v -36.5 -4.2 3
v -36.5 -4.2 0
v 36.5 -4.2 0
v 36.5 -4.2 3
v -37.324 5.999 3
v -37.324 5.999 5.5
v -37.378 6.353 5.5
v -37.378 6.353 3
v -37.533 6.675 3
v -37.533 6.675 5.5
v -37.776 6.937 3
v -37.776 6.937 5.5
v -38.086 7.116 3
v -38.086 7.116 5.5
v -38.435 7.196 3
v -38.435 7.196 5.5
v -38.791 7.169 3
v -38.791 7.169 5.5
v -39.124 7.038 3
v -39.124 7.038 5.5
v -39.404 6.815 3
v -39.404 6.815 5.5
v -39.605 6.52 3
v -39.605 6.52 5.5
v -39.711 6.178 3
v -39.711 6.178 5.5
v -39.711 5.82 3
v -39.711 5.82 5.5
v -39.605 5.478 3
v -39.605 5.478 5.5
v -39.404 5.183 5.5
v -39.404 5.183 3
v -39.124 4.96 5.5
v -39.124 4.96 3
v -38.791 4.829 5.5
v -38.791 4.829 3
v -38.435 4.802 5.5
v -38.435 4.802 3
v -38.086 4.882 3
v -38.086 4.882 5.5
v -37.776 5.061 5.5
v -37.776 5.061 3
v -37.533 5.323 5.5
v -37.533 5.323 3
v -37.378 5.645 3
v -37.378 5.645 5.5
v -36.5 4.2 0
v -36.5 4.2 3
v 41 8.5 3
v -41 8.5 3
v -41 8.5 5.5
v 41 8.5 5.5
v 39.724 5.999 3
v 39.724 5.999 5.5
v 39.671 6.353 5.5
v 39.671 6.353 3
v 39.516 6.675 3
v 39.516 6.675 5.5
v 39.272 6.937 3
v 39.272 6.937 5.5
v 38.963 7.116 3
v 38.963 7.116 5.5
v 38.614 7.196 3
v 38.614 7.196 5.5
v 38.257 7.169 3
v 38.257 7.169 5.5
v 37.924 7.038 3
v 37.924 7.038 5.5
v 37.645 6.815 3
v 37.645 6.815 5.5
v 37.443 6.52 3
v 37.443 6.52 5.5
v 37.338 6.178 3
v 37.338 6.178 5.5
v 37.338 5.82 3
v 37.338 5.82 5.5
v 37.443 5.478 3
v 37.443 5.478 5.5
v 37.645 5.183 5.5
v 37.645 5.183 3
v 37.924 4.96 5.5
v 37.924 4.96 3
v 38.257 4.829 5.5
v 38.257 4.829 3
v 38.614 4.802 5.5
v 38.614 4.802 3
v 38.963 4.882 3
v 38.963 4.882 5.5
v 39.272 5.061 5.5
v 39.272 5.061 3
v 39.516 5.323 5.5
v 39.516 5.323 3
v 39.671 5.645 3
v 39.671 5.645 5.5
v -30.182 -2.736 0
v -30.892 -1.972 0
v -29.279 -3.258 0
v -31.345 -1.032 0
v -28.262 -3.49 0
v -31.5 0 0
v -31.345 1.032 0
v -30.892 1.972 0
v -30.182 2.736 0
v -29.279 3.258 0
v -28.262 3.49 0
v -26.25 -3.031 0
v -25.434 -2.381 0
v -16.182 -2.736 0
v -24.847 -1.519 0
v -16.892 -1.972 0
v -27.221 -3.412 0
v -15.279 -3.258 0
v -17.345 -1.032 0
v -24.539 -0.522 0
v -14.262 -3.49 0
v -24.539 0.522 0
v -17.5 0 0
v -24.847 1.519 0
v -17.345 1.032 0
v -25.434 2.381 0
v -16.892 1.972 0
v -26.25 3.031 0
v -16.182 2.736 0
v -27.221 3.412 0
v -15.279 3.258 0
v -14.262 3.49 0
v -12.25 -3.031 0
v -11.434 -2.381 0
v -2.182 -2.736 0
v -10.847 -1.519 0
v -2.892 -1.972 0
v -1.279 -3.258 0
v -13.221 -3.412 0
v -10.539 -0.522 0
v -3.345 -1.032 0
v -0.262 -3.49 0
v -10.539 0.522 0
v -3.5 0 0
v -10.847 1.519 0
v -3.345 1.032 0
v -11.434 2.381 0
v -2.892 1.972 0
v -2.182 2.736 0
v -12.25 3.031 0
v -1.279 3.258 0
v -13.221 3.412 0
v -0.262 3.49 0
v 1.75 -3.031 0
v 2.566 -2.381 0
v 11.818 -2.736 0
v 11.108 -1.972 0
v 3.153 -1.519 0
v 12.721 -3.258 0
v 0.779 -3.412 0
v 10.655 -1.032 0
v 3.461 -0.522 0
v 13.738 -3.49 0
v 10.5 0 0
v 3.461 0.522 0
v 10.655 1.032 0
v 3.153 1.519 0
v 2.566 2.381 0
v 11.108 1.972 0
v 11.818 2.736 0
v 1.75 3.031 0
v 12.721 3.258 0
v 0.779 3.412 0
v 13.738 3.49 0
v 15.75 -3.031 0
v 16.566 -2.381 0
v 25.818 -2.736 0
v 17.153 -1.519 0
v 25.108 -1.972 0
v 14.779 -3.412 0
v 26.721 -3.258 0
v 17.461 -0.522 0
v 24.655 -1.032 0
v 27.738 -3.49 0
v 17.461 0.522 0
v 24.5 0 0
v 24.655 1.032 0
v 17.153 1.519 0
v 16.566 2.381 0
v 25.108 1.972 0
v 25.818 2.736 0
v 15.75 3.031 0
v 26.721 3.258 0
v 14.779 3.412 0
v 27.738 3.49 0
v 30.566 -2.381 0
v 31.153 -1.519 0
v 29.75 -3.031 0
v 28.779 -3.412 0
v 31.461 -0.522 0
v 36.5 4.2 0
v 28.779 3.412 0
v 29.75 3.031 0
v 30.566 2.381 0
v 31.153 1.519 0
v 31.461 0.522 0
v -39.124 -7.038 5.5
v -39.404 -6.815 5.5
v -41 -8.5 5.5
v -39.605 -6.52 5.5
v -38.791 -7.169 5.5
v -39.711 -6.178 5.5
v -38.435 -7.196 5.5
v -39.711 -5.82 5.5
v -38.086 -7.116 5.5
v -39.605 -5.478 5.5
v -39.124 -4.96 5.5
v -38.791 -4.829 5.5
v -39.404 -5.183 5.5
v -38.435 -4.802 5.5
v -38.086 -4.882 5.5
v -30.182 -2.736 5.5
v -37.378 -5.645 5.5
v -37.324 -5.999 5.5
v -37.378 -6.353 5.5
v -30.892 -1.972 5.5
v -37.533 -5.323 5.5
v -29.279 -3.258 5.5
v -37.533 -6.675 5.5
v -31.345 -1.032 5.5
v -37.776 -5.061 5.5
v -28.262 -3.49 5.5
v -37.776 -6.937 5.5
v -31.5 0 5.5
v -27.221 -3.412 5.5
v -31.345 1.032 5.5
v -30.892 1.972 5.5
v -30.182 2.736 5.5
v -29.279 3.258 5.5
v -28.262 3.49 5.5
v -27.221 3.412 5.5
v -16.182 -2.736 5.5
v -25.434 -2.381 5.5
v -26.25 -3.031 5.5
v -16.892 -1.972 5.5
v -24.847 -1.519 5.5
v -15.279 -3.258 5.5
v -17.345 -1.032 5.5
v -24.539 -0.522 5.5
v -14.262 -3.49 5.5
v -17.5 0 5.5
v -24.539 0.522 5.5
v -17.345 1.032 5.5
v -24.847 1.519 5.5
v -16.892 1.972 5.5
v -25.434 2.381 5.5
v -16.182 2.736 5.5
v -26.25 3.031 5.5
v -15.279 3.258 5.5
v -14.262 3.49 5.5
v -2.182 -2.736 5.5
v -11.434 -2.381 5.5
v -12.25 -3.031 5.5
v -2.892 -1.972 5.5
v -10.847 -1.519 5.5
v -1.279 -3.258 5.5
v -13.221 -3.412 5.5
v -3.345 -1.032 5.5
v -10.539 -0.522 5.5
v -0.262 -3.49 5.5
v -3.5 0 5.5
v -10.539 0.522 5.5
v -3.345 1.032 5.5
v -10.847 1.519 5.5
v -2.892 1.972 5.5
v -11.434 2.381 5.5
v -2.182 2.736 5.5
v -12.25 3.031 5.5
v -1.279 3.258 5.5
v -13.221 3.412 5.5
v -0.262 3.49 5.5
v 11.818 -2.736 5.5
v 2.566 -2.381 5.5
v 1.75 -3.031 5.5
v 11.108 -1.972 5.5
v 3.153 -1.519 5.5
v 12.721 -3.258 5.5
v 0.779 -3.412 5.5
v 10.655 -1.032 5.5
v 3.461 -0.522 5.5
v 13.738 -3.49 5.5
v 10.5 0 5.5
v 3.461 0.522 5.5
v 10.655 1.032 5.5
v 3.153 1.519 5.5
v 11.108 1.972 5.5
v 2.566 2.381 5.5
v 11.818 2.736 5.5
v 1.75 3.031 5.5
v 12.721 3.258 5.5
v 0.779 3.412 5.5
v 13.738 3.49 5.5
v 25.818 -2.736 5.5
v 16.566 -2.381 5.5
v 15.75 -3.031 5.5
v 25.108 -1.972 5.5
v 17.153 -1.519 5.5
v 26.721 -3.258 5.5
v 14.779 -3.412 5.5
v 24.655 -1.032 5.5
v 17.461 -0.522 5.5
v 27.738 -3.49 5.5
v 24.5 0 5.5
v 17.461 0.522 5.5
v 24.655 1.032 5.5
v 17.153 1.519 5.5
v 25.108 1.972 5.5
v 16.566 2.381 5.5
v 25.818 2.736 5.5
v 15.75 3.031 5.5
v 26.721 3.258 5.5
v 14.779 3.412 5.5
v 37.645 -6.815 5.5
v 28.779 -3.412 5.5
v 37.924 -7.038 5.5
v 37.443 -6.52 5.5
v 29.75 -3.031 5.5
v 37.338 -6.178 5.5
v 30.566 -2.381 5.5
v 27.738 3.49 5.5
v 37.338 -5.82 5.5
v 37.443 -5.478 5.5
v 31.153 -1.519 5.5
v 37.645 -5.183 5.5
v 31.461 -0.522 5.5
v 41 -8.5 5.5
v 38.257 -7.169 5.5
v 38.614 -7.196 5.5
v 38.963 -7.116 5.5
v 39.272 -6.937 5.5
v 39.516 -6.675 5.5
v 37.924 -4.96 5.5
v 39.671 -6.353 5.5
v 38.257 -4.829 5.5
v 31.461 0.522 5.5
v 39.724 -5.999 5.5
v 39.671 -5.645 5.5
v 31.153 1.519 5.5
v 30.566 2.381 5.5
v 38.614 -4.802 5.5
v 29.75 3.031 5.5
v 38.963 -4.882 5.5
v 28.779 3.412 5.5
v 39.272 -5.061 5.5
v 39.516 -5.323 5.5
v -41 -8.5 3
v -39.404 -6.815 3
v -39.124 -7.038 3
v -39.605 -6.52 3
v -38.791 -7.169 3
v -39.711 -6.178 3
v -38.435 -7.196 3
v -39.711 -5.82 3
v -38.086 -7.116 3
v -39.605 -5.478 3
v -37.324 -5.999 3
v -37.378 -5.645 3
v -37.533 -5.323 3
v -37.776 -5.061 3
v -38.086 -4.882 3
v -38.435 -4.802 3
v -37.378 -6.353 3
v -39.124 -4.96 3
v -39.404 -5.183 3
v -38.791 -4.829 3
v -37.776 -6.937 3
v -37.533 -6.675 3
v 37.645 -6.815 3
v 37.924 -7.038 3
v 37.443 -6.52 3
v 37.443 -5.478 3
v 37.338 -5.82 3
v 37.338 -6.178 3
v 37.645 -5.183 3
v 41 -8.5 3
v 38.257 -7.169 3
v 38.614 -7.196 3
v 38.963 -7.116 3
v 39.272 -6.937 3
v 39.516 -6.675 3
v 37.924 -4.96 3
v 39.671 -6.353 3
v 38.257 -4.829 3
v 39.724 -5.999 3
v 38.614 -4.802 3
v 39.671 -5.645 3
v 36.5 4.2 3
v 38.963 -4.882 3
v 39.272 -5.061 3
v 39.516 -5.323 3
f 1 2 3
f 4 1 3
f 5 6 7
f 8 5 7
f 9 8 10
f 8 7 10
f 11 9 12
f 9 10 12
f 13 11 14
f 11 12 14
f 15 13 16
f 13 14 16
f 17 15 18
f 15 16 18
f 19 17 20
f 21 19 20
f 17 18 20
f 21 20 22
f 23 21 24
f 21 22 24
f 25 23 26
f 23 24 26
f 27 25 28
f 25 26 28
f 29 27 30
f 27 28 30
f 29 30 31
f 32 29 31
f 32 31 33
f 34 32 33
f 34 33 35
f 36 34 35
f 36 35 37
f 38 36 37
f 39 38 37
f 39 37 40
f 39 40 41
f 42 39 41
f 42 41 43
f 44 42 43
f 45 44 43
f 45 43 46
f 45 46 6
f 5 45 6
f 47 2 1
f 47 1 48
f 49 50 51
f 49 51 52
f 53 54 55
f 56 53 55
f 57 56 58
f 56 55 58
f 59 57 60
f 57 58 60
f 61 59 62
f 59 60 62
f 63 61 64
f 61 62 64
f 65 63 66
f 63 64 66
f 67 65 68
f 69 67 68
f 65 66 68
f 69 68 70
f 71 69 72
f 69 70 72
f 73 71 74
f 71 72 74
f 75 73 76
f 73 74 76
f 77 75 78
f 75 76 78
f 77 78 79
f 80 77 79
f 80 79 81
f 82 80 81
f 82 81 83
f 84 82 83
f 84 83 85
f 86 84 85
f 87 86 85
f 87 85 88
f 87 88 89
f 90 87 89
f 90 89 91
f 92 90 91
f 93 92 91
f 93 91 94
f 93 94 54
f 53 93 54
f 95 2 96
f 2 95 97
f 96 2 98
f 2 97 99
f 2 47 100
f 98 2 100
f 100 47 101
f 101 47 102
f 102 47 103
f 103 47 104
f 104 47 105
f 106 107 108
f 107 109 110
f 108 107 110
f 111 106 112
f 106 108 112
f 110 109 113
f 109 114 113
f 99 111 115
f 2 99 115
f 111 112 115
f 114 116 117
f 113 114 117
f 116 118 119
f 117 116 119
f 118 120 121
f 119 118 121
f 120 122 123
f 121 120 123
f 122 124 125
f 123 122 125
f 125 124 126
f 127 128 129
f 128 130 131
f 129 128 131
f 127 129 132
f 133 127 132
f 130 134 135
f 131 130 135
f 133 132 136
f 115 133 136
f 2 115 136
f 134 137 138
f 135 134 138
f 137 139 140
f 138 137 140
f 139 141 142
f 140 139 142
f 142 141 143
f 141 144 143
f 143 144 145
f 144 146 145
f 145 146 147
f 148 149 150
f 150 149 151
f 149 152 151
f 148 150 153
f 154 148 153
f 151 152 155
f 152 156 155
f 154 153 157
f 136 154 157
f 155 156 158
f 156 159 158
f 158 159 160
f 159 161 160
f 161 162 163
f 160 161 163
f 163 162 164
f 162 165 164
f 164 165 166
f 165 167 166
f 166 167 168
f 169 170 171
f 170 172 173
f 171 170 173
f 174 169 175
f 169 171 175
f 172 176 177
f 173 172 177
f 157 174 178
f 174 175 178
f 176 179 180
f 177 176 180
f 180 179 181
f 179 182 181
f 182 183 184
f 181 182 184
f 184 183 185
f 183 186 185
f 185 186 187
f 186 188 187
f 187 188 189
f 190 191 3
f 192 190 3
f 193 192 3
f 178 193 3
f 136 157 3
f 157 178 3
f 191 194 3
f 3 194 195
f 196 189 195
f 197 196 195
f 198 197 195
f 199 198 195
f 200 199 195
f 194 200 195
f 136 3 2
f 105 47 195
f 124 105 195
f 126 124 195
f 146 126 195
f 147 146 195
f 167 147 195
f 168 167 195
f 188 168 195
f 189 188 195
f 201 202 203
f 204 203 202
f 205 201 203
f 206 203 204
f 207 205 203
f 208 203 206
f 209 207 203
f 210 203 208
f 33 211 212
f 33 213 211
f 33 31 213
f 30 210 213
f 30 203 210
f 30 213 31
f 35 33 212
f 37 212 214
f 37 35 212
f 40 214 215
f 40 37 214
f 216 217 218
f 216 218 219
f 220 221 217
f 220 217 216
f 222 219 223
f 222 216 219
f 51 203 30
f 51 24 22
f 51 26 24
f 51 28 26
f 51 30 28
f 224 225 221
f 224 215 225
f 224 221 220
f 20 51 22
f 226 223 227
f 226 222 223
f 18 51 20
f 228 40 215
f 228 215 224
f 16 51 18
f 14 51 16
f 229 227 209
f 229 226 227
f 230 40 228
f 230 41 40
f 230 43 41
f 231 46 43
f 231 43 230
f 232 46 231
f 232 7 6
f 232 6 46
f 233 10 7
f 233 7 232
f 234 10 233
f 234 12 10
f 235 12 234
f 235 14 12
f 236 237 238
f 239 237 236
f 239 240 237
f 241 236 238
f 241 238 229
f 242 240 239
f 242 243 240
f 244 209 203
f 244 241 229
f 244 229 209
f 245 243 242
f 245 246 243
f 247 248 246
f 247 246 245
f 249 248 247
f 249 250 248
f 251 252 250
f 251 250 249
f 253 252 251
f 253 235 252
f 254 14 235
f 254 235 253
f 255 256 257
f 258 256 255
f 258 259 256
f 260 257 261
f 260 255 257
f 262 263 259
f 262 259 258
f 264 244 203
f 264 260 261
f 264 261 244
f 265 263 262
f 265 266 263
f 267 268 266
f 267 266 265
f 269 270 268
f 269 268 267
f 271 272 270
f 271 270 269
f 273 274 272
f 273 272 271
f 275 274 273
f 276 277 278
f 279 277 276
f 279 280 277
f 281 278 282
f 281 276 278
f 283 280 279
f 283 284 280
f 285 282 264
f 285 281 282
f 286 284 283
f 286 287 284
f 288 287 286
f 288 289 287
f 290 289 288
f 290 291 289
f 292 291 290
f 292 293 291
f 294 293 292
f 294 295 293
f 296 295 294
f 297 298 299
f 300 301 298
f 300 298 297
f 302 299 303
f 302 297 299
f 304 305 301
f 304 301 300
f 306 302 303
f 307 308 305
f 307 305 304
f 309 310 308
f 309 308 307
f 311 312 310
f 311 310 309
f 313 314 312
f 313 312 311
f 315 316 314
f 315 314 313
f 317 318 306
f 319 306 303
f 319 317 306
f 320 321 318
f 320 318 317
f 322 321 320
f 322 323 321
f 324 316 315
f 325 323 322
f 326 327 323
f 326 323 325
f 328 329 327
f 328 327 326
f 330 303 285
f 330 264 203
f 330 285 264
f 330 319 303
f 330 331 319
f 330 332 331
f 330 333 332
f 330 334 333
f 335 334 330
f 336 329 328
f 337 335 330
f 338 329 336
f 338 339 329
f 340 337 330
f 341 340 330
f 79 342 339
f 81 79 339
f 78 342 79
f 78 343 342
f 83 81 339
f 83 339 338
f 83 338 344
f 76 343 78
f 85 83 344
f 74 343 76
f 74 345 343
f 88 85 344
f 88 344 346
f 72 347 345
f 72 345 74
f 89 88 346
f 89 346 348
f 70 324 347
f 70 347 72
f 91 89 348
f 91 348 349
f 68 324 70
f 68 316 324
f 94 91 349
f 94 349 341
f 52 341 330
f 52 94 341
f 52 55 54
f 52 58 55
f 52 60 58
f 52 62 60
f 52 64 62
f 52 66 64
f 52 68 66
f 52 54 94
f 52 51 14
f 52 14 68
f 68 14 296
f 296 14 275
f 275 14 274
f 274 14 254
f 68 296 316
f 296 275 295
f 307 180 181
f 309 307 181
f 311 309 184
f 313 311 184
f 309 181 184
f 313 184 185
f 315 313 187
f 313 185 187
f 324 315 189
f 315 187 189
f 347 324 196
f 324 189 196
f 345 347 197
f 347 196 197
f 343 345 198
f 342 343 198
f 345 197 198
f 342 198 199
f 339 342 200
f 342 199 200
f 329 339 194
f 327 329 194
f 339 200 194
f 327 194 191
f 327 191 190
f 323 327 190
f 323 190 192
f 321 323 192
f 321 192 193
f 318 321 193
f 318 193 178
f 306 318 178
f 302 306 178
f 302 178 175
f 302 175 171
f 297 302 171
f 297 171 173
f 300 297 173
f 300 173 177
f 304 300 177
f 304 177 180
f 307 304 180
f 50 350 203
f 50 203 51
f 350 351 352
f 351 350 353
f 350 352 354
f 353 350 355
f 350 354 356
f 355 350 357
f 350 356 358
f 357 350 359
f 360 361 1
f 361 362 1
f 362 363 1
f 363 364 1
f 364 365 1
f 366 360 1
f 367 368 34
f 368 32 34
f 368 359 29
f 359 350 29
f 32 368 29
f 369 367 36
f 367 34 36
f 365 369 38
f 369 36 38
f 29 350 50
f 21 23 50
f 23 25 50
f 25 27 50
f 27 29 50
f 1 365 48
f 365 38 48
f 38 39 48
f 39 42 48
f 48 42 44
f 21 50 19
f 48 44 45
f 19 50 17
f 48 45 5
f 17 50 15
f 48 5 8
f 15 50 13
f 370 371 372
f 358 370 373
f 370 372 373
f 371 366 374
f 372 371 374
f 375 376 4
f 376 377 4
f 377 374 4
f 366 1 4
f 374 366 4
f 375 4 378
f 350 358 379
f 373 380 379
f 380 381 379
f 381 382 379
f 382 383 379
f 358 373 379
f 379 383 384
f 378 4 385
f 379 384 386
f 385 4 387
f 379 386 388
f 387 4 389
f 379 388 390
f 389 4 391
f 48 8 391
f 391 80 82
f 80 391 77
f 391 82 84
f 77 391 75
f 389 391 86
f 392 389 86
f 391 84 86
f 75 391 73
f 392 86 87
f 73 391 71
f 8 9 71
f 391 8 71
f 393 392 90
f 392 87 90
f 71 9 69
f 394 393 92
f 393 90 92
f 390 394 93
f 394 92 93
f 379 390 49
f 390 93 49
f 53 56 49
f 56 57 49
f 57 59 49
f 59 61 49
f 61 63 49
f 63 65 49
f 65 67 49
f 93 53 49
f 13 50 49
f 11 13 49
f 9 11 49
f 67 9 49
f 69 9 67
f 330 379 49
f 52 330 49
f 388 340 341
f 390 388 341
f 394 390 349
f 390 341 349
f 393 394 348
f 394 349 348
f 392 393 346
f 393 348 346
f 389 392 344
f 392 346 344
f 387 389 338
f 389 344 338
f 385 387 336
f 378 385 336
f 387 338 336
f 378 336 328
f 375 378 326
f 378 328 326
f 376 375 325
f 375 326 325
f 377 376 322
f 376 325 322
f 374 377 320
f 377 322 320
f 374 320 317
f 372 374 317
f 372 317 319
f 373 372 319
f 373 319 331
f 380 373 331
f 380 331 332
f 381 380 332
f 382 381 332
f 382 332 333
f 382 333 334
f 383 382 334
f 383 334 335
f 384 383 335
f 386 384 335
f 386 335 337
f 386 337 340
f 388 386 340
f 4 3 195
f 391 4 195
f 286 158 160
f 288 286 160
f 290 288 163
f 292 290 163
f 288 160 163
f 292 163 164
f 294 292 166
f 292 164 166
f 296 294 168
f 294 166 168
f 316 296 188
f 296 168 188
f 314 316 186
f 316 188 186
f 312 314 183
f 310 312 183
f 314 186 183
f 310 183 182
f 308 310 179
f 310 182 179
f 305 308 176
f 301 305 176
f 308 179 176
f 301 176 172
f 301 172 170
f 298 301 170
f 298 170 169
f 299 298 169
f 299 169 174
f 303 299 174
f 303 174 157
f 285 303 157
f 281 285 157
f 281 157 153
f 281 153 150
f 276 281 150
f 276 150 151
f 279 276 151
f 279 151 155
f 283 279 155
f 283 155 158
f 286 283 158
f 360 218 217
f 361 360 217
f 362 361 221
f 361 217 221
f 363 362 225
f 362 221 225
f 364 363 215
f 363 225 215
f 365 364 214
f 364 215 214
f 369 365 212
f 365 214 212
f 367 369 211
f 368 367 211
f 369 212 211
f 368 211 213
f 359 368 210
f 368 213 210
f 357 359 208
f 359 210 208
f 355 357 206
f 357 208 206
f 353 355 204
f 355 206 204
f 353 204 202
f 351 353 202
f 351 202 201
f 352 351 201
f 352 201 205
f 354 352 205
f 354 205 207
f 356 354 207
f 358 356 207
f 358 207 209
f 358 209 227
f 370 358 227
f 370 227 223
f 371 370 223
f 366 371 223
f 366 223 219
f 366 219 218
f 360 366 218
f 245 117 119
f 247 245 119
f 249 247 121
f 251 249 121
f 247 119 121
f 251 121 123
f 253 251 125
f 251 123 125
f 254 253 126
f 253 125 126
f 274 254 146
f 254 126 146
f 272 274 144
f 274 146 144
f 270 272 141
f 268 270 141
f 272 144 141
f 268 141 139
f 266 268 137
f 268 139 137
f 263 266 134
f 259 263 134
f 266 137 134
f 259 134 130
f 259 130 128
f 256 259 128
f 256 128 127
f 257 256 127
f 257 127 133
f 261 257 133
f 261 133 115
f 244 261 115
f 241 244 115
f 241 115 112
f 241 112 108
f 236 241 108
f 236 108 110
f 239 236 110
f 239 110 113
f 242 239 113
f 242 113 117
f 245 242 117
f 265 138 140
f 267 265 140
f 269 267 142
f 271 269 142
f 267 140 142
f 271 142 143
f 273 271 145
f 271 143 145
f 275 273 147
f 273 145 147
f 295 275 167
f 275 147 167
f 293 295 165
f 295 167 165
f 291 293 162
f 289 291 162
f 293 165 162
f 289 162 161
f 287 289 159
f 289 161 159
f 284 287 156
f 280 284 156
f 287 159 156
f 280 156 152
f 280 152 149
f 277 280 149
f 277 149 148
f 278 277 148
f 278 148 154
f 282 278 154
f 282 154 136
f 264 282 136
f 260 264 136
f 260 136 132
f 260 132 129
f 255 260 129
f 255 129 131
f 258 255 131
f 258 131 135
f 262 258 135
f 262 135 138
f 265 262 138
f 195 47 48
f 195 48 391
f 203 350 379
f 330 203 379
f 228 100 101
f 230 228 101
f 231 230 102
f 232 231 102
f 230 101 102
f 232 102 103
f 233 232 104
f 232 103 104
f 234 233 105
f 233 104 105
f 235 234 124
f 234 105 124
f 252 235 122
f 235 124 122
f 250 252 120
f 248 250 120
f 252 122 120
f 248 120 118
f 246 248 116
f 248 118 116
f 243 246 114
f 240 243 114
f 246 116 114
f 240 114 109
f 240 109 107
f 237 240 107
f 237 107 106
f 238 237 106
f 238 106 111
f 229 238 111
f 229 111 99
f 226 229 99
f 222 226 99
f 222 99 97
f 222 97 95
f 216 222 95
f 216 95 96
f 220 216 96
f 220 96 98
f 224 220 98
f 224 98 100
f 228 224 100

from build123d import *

# Parameters (mm, degrees)
SKETCH_1_W             = 73
SKETCH_1_H             = 8.4
EXTRUDE_1_DEPTH        = 3
SKETCH_2_W             = 82
SKETCH_2_H             = 17
EXTRUDE_2_DEPTH        = 2.5
SKETCH_3_R             = 3.5
CUT_EXTRUDE_1_DEPTH    = 10
PATTERN_LINEAR_1_COUNT = 3
PATTERN_LINEAR_1_PITCH = 14
PATTERN_LINEAR_2_COUNT = 3
PATTERN_LINEAR_2_PITCH = 14
SKETCH_4_R             = 1.2
CUT_EXTRUDE_4_DEPTH    = 6


with BuildPart() as part:
    # Эскиз1 → Бобышка-Вытянуть1 (new body)
    with BuildSketch(Plane.XY):
        Rectangle(SKETCH_1_W, SKETCH_1_H)
    extrude(amount=EXTRUDE_1_DEPTH)

    # Эскиз2 → Бобышка-Вытянуть2 (add)
    with BuildSketch(Plane.XY.offset(3)):
        Rectangle(SKETCH_2_W, SKETCH_2_H)
    extrude(amount=EXTRUDE_2_DEPTH)

    # Эскиз3 → Вырез-Вытянуть1 (cut)
    with BuildSketch(Plane(origin=(0, 0, 0), x_dir=(-1, 0, 0), z_dir=(0, 0, -1))):
        Circle(SKETCH_3_R)
    cut_extrude_1 = extrude(amount=-CUT_EXTRUDE_1_DEPTH, mode=Mode.SUBTRACT)

    # Линейный массив1: Вырез-Вытянуть1 ×3
    with Locations(*[(i * PATTERN_LINEAR_1_PITCH, 0, 0) for i in range(1, PATTERN_LINEAR_1_COUNT)]):
        add(cut_extrude_1, mode=Mode.SUBTRACT)

    # Линейный массив2: Вырез-Вытянуть1 ×3
    with Locations(*[(-i * PATTERN_LINEAR_2_PITCH, 0, 0) for i in range(1, PATTERN_LINEAR_2_COUNT)]):
        add(cut_extrude_1, mode=Mode.SUBTRACT)

    # Эскиз4 → Вырез-Вытянуть4 (cut)
    with BuildSketch(Plane.XY.offset(5.5)):
        with Locations((-38.524276055, 5.998931776)):
            Circle(SKETCH_4_R)
        with Locations((-38.524276055, -5.998931776)):
            Circle(SKETCH_4_R)
        with Locations((38.524276055, -5.998931776)):
            Circle(SKETCH_4_R)
        with Locations((38.524276055, 5.998931776)):
            Circle(SKETCH_4_R)
    extrude(amount=-CUT_EXTRUDE_4_DEPTH, mode=Mode.SUBTRACT)


solid = part.part
